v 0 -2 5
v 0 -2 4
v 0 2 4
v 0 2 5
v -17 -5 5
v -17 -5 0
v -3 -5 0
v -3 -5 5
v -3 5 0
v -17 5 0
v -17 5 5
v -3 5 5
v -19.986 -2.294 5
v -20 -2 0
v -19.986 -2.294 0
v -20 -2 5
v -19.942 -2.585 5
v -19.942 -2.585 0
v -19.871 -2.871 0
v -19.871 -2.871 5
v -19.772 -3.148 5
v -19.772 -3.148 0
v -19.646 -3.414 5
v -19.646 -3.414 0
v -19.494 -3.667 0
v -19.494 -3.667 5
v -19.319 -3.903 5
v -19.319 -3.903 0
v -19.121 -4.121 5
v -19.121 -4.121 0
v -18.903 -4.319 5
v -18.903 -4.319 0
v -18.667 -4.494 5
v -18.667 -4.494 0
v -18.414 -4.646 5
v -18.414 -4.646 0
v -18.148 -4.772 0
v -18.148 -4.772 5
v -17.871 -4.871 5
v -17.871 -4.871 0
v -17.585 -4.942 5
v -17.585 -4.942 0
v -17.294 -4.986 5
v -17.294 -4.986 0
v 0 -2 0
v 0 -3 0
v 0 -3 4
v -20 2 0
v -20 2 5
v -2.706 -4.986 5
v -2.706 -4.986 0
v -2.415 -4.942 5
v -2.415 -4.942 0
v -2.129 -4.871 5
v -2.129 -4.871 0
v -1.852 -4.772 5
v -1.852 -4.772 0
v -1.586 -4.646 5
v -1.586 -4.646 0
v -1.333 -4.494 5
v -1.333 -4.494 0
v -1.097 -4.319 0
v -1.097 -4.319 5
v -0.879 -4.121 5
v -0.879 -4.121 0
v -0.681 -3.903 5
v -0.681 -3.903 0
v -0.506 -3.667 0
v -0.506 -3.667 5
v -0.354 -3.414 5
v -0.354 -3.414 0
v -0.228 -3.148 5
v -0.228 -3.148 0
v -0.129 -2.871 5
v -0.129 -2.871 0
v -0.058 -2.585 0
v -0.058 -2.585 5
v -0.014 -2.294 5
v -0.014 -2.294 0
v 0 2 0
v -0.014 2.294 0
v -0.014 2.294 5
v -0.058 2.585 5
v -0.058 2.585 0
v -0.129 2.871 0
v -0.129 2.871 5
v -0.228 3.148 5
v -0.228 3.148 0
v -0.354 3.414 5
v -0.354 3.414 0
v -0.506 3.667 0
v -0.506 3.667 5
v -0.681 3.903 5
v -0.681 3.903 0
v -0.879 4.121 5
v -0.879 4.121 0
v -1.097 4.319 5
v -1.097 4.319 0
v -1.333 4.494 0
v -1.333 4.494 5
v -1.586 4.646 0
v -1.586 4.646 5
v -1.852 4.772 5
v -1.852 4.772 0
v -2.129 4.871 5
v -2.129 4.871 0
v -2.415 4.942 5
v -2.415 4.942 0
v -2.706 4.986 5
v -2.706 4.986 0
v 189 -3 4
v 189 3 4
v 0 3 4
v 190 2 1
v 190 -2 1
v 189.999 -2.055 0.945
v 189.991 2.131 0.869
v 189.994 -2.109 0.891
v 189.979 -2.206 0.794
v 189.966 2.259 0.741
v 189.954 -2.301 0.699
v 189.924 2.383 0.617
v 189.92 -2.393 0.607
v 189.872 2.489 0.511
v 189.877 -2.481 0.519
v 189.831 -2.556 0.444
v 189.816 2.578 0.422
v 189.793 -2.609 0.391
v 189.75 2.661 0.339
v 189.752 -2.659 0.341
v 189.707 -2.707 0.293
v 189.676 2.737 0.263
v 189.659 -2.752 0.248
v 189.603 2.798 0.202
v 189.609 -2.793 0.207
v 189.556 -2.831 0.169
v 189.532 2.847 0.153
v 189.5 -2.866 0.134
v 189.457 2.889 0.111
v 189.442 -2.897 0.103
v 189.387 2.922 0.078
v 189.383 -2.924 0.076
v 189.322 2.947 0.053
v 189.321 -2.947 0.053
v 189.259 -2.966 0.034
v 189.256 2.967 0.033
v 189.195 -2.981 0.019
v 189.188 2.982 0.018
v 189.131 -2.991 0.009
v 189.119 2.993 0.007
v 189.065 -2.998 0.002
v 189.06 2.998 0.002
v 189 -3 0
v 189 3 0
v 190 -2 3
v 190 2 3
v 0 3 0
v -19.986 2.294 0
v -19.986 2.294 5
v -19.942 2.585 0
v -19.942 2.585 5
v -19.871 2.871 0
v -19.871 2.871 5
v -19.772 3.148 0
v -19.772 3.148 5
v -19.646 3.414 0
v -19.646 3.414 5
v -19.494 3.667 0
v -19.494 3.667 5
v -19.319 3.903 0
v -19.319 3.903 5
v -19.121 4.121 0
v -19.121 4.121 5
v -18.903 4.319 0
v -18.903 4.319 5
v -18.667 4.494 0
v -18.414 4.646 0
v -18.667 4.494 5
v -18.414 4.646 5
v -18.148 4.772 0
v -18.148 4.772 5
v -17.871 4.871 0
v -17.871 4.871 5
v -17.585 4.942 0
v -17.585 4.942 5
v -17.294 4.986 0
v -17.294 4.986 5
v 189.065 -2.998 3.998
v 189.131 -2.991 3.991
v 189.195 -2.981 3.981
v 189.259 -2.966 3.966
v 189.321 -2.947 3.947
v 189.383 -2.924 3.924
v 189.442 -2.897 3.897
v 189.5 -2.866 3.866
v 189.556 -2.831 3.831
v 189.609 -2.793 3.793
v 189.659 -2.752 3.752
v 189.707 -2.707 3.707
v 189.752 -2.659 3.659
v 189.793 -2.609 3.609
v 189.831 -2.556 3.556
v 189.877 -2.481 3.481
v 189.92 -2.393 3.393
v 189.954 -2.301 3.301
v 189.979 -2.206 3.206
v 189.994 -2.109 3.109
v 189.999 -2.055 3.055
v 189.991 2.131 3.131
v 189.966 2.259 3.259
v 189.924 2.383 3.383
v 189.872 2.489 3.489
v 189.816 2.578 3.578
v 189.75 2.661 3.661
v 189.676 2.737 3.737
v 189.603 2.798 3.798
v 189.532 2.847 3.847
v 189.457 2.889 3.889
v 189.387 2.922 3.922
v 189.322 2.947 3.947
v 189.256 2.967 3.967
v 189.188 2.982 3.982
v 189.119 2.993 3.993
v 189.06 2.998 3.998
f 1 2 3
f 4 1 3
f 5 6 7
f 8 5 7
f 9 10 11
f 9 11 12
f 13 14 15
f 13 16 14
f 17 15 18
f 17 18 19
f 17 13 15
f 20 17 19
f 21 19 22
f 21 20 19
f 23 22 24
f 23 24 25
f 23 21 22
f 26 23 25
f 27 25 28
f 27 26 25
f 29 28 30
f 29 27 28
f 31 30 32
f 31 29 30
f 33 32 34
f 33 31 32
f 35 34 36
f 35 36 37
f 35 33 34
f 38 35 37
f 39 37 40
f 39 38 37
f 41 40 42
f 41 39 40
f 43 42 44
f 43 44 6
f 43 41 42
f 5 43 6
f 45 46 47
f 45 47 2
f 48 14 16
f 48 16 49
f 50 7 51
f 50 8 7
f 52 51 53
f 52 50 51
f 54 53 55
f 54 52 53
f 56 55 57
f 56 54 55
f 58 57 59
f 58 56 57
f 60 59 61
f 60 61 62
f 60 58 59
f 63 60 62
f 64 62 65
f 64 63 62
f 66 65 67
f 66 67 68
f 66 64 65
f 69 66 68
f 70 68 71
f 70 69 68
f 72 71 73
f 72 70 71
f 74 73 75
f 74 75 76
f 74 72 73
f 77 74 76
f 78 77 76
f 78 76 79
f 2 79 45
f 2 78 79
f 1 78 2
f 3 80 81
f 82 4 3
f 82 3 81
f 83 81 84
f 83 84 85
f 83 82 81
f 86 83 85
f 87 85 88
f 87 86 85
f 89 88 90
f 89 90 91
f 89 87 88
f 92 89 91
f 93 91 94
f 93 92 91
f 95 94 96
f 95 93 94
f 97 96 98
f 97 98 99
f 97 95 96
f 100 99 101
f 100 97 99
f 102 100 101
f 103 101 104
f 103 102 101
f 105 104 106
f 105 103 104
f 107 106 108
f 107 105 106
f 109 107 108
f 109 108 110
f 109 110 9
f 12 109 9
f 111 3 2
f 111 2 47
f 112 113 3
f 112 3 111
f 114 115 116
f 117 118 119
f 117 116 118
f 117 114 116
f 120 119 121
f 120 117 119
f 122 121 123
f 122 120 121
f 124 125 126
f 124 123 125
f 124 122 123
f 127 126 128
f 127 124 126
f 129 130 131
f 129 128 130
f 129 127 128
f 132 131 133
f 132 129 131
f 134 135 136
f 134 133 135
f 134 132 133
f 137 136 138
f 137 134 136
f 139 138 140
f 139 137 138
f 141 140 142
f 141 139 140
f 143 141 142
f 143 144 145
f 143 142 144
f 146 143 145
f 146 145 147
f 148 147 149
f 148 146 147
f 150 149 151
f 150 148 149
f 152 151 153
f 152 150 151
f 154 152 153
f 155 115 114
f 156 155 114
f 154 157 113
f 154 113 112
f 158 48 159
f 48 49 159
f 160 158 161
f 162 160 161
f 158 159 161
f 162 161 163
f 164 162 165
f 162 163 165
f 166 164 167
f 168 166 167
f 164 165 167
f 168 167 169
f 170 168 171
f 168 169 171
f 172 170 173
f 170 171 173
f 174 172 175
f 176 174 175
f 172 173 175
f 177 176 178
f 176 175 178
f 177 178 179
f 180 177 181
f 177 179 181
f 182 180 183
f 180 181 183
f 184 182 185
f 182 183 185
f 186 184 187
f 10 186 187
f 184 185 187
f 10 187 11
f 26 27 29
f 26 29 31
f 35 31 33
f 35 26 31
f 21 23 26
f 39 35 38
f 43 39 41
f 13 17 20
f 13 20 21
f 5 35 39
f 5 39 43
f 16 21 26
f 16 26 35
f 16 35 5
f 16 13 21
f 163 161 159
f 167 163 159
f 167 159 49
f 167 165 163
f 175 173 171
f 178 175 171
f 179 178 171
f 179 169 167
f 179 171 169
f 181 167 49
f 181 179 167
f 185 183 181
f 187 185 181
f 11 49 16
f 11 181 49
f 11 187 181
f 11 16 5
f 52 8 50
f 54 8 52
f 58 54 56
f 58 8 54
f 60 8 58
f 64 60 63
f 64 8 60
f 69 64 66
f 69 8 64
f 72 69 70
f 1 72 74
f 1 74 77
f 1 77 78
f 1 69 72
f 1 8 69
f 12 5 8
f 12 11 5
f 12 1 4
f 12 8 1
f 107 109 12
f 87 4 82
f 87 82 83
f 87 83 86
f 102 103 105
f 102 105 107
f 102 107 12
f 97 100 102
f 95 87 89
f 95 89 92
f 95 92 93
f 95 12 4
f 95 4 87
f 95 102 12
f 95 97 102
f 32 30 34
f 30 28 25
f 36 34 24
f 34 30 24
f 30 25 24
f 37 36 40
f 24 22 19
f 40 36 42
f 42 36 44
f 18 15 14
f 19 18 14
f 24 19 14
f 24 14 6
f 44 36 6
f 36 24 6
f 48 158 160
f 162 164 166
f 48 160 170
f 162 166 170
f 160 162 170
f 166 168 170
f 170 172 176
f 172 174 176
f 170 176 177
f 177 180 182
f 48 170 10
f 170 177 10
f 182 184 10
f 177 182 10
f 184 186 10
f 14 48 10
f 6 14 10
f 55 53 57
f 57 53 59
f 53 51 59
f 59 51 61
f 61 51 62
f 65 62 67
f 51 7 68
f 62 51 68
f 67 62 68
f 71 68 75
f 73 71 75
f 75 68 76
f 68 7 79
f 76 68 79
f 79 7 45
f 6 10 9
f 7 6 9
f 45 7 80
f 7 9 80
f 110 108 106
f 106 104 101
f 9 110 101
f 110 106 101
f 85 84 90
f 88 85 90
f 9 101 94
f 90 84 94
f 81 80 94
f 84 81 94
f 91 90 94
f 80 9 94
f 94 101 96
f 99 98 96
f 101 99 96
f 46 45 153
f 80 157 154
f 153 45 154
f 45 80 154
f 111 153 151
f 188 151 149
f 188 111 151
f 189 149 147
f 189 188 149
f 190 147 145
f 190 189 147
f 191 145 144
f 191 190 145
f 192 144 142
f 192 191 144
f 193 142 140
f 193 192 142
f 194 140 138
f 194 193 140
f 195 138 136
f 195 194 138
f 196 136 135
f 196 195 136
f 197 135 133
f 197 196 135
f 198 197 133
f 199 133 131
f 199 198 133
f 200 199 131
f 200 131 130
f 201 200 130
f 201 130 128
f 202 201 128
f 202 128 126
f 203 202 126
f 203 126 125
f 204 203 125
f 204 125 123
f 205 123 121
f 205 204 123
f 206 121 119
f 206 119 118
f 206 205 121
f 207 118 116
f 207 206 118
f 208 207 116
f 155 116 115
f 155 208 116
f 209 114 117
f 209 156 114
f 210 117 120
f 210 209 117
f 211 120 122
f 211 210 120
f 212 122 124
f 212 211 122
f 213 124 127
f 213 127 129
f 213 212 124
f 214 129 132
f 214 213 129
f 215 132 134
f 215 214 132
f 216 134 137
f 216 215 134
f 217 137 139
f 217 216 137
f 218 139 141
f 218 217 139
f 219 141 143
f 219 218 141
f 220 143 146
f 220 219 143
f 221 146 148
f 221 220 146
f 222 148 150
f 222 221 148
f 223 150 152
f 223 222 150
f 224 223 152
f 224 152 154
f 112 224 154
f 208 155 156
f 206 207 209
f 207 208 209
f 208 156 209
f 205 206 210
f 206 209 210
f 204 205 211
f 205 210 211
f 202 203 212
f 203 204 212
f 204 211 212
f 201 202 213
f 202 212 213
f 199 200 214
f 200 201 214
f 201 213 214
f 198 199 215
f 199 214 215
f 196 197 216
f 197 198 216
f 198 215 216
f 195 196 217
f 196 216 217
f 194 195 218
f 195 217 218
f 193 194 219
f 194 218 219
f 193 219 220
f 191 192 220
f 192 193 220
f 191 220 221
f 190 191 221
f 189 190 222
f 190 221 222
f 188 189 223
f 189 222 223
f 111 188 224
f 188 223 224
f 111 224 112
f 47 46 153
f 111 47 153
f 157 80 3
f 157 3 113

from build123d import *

# Parameters (mm, degrees)
BOX_W        = 190
BOX_H        = 6
BOX_DEPTH    = 4
FILLET001_R  = 1
BOX001_W     = 20
BOX001_H     = 10
BOX001_DEPTH = 5
FILLET_R     = 3


with BuildPart() as handle_fillet:
    # Box → Box (new body)
    with BuildSketch(Plane(origin=(0, -3, 0), x_dir=(1, 0, 0), z_dir=(0, 0, 1))):
        with Locations((95, 3)):
            Rectangle(BOX_W, BOX_H)
    extrude(amount=BOX_DEPTH)

    # Fillet001
    fillet001_edges = [handle_fillet.edges().sort_by_distance(p)[0] for p in [
        (190, -3, 2),
        (190, 0, 4),
        (190, 3, 2),
        (190, 0, 0),
    ]]
    fillet(fillet001_edges, radius=FILLET001_R)


with BuildPart() as spade:
    # Box001 → Box001 (new body)
    with BuildSketch(Plane(origin=(-20, -5, 0), x_dir=(1, 0, 0), z_dir=(0, 0, 1))):
        with Locations((10, 5)):
            Rectangle(BOX001_W, BOX001_H)
    extrude(amount=BOX001_DEPTH)

    # Fillet
    fillet_edges = [spade.edges().sort_by_distance(p)[0] for p in [
        (-20, -5, 2.5),
        (-20, 5, 2.5),
        (0, -5, 2.5),
        (0, 5, 2.5),
    ]]
    fillet(fillet_edges, radius=FILLET_R)

    # Fusion: union handle fillet
    add(handle_fillet.part)


solid = spade.part
